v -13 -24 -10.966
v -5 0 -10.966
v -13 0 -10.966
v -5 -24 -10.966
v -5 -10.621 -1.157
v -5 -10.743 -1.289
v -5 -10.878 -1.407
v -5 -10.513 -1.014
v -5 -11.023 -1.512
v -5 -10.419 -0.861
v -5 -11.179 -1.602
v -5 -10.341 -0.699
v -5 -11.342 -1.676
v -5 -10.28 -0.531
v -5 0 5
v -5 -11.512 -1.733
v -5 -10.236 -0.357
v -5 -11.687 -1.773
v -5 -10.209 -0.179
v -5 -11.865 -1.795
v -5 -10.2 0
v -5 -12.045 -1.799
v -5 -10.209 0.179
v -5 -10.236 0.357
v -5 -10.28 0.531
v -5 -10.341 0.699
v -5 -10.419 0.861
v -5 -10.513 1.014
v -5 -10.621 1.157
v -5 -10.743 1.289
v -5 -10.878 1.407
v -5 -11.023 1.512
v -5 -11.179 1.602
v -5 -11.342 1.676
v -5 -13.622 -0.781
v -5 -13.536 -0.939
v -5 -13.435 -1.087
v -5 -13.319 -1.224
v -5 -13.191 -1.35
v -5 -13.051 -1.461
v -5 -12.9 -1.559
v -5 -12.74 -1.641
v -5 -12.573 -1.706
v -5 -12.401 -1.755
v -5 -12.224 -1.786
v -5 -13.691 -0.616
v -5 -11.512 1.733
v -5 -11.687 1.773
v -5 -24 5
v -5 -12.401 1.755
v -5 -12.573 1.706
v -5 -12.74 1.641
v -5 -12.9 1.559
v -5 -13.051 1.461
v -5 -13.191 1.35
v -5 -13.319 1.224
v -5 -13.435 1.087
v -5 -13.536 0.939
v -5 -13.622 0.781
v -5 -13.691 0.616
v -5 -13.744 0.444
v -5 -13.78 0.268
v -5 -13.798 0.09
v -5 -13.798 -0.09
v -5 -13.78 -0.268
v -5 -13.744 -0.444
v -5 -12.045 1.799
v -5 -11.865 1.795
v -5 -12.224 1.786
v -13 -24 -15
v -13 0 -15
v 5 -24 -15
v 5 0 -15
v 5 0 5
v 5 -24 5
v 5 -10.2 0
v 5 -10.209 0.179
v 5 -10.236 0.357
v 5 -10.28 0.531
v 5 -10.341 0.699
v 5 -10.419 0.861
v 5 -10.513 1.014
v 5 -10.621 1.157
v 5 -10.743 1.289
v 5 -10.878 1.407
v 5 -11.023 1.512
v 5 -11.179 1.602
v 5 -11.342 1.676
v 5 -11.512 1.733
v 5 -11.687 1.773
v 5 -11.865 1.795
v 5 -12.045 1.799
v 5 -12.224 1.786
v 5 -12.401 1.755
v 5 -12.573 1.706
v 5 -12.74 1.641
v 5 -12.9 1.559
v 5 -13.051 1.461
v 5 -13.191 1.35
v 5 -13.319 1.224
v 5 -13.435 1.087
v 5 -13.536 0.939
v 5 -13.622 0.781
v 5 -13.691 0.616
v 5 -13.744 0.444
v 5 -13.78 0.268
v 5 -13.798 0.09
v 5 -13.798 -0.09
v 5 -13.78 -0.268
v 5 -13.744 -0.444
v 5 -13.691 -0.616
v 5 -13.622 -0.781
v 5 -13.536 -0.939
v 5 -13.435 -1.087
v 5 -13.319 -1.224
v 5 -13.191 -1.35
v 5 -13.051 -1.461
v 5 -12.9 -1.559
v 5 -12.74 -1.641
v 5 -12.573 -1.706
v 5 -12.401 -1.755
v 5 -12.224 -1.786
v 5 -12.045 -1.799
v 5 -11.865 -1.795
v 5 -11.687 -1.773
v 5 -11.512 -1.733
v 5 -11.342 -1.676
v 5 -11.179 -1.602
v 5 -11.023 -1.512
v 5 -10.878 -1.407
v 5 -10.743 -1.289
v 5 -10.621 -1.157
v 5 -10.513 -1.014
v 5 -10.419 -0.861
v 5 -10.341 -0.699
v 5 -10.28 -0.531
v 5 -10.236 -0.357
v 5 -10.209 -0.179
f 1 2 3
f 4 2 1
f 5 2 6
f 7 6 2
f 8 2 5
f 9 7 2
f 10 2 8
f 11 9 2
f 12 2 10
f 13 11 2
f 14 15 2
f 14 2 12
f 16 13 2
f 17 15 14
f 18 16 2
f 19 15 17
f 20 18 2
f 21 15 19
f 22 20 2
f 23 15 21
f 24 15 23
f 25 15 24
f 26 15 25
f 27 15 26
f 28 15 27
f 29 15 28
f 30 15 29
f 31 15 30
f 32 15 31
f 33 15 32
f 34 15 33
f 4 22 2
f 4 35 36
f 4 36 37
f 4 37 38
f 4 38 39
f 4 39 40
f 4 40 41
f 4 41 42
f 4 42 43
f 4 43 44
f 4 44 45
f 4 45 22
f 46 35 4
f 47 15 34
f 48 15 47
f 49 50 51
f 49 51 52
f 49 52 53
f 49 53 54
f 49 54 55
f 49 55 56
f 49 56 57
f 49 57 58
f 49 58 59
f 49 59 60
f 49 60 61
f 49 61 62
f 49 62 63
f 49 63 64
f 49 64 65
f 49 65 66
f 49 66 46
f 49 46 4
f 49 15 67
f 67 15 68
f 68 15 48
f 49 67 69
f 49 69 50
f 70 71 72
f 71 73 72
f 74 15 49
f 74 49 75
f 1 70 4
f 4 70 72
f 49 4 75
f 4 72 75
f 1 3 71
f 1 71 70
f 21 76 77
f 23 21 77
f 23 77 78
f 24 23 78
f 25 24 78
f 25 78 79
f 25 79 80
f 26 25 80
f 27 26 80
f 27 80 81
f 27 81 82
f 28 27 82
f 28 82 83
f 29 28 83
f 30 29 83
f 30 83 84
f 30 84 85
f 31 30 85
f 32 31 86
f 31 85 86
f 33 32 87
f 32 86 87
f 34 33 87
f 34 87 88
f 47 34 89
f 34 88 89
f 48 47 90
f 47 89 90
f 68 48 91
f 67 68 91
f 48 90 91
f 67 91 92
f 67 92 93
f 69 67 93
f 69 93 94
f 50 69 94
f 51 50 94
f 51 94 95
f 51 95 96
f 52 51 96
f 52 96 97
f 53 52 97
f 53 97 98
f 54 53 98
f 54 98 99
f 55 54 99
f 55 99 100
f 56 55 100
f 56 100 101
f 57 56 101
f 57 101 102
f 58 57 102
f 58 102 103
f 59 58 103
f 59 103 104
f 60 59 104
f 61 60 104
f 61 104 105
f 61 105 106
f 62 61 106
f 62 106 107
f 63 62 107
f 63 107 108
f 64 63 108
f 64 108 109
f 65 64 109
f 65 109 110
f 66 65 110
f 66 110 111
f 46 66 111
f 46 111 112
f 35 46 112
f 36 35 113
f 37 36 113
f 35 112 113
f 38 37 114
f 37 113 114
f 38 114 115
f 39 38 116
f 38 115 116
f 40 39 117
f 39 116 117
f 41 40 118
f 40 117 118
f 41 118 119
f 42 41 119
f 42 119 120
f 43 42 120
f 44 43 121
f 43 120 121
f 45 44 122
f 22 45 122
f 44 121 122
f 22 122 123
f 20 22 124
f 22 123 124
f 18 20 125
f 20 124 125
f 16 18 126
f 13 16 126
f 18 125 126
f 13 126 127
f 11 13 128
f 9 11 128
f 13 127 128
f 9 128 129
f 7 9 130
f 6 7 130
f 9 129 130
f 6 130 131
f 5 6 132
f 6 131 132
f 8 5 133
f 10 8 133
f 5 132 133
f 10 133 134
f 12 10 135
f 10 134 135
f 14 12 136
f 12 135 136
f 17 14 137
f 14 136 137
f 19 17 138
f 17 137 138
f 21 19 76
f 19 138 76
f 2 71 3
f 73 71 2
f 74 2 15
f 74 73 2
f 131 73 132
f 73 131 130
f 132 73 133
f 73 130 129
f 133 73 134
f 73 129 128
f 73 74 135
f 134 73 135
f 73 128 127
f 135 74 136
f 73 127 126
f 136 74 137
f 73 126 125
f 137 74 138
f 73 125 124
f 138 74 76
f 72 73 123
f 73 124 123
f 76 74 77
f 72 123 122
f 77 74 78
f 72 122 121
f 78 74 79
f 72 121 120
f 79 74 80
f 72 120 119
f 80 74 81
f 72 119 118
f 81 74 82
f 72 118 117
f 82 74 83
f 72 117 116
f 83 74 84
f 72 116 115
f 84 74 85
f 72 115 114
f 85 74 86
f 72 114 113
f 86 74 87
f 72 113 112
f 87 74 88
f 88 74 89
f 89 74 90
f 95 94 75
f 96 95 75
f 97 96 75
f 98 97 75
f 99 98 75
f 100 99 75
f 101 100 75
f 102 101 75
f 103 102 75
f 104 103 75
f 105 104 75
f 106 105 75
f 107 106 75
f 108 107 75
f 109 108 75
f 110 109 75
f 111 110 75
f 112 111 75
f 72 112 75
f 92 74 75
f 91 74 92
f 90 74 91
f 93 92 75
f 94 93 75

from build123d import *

# Parameters (mm, degrees)
F0_W     = 10
F0_H     = 10
F1_DEPTH = 24
F3_D     = 3.6
F4_DEPTH = 10
F5_W     = 24
F5_H     = 4.0339039266
F6_DEPTH = 6.5
F7_DEPTH = 1.5


with BuildPart() as f1:
    # F0 (on Front) → F1 (new body)
    with BuildSketch(Plane.XZ):
        Rectangle(F0_W, F0_H)
    extrude(amount=F1_DEPTH)

    # F3 (through all)
    with Locations(Plane(origin=(-5, 0, 0), x_dir=(0, -1, 0), z_dir=(-1, 0, 0))):
        with Locations((12, 0)):
            Hole(F3_D / 2)

    # F4 (add): a face of the model
    f4_faces = [f1.faces().sort_by_distance(p)[0] for p in [
        (0, -12, -5),
    ]]
    extrude(f4_faces, amount=F4_DEPTH)

    # F5 (on face) → F6 (join)
    with BuildSketch(Plane(origin=(-5, 0, 0), x_dir=(0, -1, 0), z_dir=(-1, 0, 0))):
        with Locations((12, -12.9830480367)):
            Rectangle(F5_W, F5_H)
    extrude(amount=F6_DEPTH)

    # F7 (add): a face of the model
    f7_faces = [f1.faces().sort_by_distance(p)[0] for p in [
        (-11.5, -12, -12.9830480367),
    ]]
    extrude(f7_faces, amount=F7_DEPTH)


solid = f1.part
